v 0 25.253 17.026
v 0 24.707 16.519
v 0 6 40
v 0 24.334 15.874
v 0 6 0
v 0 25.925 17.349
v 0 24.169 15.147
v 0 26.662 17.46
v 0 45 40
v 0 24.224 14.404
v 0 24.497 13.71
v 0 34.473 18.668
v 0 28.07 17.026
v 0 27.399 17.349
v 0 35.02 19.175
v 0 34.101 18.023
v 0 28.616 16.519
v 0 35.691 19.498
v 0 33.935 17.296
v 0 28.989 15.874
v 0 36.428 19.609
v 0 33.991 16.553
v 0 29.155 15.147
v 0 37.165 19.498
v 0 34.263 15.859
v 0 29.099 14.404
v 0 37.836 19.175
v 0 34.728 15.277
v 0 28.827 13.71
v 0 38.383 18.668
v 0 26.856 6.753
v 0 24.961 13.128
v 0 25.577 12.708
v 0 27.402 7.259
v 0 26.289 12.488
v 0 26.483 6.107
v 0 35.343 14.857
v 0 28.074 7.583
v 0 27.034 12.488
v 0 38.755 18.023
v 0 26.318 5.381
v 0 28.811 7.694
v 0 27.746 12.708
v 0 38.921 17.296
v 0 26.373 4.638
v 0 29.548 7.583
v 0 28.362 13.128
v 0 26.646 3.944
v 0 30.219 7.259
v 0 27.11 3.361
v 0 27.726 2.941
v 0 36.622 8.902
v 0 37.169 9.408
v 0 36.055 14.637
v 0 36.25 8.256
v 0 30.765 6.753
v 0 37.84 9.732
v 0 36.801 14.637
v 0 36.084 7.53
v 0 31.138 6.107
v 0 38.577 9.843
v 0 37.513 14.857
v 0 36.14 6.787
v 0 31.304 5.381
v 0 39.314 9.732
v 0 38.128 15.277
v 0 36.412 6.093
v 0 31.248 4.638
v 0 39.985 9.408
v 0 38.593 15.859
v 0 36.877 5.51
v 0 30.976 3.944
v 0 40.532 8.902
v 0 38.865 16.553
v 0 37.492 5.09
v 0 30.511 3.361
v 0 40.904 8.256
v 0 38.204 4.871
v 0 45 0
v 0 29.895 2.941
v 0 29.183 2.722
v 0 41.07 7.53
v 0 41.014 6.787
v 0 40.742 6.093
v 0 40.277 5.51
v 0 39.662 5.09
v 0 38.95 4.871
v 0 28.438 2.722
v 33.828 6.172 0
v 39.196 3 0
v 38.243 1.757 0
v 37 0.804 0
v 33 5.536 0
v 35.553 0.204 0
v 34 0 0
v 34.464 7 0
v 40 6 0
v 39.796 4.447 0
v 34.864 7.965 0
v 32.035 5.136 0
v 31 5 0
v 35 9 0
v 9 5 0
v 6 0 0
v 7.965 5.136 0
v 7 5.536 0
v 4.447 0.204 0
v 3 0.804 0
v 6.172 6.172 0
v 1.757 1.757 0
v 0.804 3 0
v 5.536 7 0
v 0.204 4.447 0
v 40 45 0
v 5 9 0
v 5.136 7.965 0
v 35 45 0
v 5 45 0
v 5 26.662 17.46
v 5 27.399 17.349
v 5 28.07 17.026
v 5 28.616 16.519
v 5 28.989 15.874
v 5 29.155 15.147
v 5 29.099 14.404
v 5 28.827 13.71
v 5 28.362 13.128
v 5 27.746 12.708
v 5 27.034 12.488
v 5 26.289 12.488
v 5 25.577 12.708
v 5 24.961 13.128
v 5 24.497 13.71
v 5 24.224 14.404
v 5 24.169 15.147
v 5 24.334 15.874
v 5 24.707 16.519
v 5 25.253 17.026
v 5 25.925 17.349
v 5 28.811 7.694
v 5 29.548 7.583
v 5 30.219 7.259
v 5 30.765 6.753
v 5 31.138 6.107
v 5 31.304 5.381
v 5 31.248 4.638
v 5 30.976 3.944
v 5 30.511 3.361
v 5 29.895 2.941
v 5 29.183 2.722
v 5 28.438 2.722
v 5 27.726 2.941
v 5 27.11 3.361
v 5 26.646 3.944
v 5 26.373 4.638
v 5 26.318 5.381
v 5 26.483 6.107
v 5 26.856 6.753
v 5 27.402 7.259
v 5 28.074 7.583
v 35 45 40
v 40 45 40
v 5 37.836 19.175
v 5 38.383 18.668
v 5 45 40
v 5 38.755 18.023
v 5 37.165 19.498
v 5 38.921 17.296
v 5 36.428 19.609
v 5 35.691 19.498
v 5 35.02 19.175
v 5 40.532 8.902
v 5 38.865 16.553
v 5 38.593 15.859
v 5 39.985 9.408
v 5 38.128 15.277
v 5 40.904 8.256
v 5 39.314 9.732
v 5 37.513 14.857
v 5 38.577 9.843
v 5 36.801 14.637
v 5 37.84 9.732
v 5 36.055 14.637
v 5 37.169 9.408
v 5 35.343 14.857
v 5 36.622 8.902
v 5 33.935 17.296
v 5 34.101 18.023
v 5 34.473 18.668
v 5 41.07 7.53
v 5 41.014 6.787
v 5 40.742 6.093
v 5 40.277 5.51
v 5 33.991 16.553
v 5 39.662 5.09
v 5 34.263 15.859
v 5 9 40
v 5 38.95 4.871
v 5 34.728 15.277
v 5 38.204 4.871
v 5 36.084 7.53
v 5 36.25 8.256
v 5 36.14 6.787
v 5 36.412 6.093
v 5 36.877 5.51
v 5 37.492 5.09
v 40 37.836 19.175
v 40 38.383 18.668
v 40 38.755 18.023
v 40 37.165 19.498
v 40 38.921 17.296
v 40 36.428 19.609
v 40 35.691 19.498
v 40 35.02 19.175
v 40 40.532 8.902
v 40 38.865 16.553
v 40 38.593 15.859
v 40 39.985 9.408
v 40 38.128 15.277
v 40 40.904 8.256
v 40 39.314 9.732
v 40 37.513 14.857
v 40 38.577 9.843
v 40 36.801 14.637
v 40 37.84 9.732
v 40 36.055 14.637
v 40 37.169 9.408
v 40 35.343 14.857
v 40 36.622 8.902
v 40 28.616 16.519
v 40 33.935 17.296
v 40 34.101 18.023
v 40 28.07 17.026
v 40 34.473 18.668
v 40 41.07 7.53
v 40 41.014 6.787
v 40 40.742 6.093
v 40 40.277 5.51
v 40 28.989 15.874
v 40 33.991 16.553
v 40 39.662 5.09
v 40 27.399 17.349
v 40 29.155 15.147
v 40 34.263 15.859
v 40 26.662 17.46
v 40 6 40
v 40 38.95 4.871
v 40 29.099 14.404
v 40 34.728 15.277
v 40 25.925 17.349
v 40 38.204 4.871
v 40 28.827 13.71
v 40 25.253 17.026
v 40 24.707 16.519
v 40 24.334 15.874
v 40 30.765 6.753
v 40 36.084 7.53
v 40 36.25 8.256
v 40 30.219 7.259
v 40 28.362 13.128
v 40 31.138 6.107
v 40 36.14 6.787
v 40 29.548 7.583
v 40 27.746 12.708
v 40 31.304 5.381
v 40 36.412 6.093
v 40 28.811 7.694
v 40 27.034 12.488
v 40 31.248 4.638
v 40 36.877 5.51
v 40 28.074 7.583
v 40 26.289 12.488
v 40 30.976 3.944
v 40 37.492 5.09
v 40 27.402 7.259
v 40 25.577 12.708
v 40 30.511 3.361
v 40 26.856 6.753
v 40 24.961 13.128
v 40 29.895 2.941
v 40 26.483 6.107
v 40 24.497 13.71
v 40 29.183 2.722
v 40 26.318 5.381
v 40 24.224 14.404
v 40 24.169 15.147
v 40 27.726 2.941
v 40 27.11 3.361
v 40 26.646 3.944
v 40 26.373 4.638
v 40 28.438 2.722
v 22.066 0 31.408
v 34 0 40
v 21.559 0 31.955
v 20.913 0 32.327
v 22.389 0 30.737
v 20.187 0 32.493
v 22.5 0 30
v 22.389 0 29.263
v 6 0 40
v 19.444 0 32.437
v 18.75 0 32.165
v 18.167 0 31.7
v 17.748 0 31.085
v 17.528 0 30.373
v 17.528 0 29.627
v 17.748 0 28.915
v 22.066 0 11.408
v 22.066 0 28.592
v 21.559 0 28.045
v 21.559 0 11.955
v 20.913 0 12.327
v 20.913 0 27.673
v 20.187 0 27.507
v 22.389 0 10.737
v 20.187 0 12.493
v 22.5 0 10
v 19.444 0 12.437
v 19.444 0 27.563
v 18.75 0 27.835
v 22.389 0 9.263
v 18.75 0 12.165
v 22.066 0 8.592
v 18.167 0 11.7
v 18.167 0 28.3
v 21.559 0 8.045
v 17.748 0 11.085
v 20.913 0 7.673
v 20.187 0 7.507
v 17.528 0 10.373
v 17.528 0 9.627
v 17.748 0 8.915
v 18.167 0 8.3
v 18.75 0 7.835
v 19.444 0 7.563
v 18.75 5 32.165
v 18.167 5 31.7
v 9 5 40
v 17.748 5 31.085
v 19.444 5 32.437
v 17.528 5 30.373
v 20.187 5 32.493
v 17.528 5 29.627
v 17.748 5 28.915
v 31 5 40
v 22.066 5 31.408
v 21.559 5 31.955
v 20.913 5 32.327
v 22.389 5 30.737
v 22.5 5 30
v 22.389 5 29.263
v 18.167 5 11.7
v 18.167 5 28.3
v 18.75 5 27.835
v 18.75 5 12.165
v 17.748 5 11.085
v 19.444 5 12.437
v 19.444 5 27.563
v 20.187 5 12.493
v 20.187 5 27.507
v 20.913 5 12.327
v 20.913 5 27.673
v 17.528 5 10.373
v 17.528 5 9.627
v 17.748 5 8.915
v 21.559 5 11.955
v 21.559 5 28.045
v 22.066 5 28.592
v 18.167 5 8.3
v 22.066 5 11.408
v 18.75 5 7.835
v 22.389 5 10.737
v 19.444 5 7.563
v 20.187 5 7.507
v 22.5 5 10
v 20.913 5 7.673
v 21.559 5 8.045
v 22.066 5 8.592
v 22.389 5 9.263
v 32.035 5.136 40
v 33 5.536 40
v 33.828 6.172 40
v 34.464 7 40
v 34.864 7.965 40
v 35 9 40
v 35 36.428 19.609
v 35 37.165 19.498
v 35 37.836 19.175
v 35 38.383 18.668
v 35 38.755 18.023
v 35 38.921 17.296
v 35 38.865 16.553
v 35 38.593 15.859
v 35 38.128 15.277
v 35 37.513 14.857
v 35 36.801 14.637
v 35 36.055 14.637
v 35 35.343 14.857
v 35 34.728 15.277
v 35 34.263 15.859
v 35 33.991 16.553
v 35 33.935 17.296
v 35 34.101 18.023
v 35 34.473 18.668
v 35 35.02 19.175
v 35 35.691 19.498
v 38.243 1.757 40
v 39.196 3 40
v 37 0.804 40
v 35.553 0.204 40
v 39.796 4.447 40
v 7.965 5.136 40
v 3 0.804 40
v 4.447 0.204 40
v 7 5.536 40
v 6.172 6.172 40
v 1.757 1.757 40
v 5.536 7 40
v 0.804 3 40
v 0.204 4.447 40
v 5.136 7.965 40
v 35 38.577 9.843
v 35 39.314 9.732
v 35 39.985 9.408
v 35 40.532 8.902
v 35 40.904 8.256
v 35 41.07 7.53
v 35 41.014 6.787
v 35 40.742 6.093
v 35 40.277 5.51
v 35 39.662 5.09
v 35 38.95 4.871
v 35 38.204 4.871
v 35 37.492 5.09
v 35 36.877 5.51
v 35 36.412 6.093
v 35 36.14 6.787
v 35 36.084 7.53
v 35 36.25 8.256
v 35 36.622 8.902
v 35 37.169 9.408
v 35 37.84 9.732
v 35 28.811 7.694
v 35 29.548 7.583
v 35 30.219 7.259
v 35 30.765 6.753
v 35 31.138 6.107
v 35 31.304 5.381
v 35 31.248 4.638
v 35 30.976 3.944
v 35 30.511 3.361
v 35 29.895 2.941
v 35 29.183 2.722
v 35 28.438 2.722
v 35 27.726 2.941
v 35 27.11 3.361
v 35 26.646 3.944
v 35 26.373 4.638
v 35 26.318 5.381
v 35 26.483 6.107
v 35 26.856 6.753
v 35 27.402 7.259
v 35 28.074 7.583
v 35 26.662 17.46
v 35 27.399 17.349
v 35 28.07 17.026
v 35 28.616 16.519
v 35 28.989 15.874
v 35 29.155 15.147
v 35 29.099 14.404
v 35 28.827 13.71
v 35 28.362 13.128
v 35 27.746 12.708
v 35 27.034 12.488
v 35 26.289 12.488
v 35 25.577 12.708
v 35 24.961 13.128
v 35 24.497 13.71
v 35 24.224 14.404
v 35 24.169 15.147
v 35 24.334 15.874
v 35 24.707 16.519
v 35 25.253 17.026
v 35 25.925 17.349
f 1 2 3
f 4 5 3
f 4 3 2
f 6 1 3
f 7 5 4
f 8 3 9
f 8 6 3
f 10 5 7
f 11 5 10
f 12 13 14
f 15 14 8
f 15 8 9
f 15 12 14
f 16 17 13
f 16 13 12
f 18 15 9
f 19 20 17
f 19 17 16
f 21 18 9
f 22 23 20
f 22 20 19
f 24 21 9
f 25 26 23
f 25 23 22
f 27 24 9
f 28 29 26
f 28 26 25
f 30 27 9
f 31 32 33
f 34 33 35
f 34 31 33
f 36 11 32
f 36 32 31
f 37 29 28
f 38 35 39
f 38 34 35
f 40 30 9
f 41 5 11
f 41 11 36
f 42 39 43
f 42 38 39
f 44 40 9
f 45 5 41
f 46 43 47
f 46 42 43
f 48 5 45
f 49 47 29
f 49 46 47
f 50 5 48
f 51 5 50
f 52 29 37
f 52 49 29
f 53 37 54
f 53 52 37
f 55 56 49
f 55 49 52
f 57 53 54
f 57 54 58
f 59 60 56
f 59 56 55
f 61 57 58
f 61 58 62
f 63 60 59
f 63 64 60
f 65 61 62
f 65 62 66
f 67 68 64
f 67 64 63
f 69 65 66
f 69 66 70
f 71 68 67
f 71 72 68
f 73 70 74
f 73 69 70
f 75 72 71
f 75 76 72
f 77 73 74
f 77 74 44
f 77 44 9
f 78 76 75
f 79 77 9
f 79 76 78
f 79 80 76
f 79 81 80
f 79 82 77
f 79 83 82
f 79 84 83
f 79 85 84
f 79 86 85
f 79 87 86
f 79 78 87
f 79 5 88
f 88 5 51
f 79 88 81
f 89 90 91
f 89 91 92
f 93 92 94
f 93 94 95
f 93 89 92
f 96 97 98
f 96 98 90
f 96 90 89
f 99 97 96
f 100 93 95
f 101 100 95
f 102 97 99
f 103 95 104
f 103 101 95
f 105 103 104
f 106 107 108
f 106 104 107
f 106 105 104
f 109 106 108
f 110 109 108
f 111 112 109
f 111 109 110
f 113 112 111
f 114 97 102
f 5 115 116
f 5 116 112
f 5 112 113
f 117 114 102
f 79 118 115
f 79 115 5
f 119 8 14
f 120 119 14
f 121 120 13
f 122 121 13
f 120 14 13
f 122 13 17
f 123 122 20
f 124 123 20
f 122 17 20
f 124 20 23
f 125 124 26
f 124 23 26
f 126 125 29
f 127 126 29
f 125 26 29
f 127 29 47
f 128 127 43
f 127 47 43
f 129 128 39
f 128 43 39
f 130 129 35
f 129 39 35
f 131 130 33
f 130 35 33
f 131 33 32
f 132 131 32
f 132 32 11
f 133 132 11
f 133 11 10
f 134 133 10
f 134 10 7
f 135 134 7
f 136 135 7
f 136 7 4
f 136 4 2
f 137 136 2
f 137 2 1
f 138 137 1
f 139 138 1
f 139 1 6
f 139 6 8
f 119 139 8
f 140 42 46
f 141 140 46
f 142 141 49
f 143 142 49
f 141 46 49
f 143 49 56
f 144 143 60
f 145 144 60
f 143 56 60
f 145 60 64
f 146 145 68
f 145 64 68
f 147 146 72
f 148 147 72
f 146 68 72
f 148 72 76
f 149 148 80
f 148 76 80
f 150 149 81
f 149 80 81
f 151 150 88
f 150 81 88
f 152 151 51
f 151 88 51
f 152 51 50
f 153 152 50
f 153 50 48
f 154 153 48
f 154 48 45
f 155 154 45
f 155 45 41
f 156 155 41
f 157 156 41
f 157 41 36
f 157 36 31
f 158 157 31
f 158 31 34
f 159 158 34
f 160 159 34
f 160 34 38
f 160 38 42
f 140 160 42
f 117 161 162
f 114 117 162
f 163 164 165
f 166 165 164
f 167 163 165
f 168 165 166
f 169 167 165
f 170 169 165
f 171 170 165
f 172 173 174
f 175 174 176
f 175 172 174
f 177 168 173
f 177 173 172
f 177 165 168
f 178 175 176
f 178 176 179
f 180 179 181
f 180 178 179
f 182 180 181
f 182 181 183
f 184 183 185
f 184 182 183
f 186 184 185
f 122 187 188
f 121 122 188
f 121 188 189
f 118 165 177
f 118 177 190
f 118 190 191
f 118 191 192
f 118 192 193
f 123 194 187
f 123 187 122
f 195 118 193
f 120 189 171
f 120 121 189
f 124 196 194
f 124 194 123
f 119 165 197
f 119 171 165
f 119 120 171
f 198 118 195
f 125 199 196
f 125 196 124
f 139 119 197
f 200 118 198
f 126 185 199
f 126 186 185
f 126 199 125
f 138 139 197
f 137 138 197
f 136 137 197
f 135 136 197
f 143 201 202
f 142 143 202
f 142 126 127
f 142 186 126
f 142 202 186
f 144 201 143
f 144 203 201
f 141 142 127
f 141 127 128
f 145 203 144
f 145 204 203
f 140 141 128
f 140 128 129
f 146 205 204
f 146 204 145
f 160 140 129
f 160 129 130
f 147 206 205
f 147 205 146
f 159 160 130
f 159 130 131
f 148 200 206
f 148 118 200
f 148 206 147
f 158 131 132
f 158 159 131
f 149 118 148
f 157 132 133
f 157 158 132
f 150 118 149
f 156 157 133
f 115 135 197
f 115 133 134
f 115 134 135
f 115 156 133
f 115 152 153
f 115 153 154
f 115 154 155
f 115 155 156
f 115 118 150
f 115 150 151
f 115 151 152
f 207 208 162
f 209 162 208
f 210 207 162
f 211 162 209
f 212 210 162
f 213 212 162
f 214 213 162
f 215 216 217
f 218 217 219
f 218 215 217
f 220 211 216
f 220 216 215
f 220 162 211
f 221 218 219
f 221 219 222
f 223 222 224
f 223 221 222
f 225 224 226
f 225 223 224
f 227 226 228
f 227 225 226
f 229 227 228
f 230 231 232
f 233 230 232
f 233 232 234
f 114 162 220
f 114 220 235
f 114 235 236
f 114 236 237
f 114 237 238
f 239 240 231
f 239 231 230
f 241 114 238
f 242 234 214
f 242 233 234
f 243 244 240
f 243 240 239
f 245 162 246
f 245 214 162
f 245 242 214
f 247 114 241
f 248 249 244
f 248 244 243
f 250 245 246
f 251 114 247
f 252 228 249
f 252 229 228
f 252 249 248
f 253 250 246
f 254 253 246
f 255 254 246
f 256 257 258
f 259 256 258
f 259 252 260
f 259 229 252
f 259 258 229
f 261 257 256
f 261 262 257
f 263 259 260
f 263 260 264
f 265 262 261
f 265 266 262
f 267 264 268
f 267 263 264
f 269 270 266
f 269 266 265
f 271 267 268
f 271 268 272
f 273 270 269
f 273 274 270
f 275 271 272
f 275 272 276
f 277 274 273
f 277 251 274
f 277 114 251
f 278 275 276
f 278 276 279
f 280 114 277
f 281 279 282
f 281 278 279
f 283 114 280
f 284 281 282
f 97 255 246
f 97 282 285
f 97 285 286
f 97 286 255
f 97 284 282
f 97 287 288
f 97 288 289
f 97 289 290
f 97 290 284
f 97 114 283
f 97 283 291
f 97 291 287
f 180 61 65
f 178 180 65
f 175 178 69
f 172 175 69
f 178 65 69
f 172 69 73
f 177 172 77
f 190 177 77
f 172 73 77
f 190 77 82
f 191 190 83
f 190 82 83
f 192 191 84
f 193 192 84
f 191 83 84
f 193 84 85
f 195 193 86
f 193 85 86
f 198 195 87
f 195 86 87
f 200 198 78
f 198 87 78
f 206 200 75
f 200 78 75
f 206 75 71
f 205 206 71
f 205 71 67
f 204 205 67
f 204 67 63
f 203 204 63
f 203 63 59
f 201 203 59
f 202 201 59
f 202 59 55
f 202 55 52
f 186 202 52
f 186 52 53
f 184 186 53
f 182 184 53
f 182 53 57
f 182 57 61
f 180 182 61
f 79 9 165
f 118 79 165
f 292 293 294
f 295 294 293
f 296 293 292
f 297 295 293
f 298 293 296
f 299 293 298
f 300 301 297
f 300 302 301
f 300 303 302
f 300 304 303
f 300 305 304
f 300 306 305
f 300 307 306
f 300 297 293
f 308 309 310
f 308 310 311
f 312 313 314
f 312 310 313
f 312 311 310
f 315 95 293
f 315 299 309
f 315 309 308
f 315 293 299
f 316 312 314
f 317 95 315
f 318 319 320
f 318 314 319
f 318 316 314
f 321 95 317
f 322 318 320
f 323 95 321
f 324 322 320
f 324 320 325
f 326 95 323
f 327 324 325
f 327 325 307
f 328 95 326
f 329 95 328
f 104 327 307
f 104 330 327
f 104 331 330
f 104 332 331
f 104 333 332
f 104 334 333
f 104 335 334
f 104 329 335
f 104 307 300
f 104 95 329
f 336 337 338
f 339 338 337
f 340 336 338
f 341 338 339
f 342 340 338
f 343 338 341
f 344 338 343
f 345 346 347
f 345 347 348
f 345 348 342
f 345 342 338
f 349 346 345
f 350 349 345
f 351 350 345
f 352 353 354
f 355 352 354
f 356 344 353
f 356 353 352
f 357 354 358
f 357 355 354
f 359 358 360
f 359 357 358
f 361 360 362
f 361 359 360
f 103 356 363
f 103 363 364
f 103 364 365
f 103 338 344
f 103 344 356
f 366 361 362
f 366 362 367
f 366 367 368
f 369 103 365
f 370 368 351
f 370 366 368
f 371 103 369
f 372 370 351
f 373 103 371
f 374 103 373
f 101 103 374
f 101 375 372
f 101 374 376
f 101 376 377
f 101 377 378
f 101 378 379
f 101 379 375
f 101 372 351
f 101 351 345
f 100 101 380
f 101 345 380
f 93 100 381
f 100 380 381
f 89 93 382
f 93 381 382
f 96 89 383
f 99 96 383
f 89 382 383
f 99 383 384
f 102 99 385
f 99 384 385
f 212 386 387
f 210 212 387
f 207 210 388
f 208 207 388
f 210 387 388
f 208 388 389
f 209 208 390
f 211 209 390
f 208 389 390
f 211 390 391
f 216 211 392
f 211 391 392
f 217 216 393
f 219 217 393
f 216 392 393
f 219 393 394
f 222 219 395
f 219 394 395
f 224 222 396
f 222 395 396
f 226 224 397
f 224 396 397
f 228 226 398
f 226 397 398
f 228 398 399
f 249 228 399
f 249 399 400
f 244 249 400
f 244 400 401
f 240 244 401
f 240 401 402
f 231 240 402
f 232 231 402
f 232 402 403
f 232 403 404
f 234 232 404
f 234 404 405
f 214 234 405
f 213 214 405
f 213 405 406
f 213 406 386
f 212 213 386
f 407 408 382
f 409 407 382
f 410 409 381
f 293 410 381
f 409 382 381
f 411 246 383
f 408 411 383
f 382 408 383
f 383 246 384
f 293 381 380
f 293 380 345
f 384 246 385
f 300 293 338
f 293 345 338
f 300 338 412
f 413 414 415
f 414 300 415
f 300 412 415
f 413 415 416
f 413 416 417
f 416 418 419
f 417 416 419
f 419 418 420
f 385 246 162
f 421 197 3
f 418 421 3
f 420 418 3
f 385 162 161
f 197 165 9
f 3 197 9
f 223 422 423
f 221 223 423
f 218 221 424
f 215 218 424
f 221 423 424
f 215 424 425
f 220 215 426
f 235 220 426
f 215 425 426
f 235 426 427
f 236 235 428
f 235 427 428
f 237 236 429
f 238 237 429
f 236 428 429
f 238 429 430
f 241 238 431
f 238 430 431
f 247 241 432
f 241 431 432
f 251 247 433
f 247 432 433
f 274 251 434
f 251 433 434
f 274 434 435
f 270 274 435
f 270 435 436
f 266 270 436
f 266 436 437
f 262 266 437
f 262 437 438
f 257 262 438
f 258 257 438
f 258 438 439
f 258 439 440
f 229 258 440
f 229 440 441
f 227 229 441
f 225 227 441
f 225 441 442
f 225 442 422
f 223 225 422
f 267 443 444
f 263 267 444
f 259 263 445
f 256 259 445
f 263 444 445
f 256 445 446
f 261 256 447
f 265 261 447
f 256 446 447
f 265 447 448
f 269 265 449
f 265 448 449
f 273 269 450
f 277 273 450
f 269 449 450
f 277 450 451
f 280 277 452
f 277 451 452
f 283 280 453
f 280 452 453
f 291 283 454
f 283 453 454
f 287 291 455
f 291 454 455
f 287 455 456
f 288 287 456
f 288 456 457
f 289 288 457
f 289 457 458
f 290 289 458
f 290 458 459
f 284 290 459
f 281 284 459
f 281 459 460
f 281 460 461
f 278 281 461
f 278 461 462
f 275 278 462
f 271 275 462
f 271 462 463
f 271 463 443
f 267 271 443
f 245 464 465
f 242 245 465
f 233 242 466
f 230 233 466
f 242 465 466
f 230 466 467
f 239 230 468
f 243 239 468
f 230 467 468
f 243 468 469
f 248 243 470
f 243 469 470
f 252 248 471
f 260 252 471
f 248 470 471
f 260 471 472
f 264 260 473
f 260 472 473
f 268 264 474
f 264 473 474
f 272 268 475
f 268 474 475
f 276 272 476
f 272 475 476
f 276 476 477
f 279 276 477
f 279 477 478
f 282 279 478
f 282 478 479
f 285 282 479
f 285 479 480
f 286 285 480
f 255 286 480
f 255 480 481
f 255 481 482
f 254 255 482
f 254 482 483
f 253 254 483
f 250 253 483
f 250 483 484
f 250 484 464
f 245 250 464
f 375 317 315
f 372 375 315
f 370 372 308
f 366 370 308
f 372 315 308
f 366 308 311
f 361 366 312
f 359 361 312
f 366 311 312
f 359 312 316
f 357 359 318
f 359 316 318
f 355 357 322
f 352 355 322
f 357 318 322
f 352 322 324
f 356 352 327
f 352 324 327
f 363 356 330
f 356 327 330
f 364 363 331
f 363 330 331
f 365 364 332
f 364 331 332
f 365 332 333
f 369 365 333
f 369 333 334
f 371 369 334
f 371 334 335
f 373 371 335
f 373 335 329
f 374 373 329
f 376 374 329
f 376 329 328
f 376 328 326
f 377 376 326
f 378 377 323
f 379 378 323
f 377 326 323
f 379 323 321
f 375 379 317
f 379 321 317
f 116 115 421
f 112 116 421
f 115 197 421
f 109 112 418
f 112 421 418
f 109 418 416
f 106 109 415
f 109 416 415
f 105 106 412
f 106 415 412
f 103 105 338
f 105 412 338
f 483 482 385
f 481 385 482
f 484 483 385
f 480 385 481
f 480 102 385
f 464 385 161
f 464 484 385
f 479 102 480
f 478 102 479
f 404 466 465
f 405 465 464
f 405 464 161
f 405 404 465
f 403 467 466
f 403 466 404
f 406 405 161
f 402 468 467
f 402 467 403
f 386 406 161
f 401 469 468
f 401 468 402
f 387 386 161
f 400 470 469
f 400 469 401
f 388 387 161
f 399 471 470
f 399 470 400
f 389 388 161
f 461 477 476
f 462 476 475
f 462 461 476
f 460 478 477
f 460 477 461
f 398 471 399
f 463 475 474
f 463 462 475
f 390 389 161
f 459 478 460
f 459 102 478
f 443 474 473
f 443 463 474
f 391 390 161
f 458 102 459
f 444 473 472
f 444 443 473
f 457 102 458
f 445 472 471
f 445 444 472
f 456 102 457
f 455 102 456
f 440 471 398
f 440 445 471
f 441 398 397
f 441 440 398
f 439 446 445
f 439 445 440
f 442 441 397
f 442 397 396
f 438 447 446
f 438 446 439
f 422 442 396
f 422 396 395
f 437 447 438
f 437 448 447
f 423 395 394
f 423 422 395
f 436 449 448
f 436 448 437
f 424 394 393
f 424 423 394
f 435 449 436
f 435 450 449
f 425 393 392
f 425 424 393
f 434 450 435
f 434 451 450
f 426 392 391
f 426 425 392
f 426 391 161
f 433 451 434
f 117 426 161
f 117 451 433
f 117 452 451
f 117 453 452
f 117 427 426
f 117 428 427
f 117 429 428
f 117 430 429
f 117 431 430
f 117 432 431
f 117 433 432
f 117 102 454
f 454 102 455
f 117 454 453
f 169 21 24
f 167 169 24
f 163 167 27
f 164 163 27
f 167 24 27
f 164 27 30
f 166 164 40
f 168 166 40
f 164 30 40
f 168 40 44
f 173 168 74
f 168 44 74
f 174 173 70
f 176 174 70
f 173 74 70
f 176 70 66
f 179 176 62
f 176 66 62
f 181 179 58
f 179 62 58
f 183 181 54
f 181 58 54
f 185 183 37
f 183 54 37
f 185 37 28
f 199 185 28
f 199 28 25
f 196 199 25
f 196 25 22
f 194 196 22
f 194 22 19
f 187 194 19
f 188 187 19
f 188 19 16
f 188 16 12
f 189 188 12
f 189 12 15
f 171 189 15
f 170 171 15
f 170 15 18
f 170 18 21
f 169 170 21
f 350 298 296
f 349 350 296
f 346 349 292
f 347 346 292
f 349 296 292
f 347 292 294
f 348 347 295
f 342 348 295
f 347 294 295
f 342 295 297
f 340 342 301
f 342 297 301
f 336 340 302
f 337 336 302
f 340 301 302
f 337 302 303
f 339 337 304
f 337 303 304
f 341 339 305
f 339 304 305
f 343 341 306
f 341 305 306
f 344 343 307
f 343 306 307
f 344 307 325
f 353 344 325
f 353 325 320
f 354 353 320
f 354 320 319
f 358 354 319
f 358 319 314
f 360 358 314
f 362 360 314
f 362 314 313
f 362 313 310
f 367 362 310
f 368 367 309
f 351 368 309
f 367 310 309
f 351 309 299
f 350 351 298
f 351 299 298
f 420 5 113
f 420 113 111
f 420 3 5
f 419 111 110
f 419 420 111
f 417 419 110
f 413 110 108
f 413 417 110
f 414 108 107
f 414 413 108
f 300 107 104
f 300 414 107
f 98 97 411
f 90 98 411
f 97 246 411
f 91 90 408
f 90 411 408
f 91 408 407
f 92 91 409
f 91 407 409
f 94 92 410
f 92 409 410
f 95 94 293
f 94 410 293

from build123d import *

# Parameters (mm, degrees)
RESSALTO_EXTRUS_O1_DEPTH = 40
FILETE1_R                = 6
ESBO_O3_R                = 2.5
CORTE_EXTRUS_O1_DEPTH    = 60
FILETE2_R                = 4
ESBO_O6_R                = 2.5
CORTE_EXTRUS_O4_DEPTH    = 5


with BuildPart() as part:
    # Esboço1 → Ressalto-extrusão1 (new body)
    with BuildSketch(Plane.XY):
        Polygon((0, 0), (0, 45), (5, 45), (5, 5), (35, 5), (35, 45), (40, 45), (40, 0), align=None)
    extrude(amount=RESSALTO_EXTRUS_O1_DEPTH)

    # Filete1
    filete1_edges = [part.edges().sort_by_distance(p)[0] for p in [
        (0, 0, 20),
        (40, 0, 20),
    ]]
    fillet(filete1_edges, radius=FILETE1_R)

    # Esboço3 → Corte-extrusão1 (cut)
    with BuildSketch(Plane.ZY):
        with Locations((7.342858474, 38.577006564)):
            Circle(ESBO_O3_R)
        with Locations((17.109227068, 36.428042981)):
            Circle(ESBO_O3_R)
        with Locations((14.960263485, 26.661674387)):
            Circle(ESBO_O3_R)
        with Locations((5.193894891, 28.810637969)):
            Circle(ESBO_O3_R)
    extrude(amount=-CORTE_EXTRUS_O1_DEPTH, mode=Mode.SUBTRACT)

    # Filete2
    filete2_edges = [part.edges().sort_by_distance(p)[0] for p in [
        (5, 5, 20),
        (35, 5, 20),
    ]]
    fillet(filete2_edges, radius=FILETE2_R)

    # Esboço6 → Corte-extrusão4 (cut)
    with BuildSketch(Plane.XZ):
        with Locations((20, 30)):
            Circle(ESBO_O6_R)
        with Locations((20, 10)):
            Circle(ESBO_O6_R)
    extrude(amount=-CORTE_EXTRUS_O4_DEPTH, mode=Mode.SUBTRACT)


solid = part.part
